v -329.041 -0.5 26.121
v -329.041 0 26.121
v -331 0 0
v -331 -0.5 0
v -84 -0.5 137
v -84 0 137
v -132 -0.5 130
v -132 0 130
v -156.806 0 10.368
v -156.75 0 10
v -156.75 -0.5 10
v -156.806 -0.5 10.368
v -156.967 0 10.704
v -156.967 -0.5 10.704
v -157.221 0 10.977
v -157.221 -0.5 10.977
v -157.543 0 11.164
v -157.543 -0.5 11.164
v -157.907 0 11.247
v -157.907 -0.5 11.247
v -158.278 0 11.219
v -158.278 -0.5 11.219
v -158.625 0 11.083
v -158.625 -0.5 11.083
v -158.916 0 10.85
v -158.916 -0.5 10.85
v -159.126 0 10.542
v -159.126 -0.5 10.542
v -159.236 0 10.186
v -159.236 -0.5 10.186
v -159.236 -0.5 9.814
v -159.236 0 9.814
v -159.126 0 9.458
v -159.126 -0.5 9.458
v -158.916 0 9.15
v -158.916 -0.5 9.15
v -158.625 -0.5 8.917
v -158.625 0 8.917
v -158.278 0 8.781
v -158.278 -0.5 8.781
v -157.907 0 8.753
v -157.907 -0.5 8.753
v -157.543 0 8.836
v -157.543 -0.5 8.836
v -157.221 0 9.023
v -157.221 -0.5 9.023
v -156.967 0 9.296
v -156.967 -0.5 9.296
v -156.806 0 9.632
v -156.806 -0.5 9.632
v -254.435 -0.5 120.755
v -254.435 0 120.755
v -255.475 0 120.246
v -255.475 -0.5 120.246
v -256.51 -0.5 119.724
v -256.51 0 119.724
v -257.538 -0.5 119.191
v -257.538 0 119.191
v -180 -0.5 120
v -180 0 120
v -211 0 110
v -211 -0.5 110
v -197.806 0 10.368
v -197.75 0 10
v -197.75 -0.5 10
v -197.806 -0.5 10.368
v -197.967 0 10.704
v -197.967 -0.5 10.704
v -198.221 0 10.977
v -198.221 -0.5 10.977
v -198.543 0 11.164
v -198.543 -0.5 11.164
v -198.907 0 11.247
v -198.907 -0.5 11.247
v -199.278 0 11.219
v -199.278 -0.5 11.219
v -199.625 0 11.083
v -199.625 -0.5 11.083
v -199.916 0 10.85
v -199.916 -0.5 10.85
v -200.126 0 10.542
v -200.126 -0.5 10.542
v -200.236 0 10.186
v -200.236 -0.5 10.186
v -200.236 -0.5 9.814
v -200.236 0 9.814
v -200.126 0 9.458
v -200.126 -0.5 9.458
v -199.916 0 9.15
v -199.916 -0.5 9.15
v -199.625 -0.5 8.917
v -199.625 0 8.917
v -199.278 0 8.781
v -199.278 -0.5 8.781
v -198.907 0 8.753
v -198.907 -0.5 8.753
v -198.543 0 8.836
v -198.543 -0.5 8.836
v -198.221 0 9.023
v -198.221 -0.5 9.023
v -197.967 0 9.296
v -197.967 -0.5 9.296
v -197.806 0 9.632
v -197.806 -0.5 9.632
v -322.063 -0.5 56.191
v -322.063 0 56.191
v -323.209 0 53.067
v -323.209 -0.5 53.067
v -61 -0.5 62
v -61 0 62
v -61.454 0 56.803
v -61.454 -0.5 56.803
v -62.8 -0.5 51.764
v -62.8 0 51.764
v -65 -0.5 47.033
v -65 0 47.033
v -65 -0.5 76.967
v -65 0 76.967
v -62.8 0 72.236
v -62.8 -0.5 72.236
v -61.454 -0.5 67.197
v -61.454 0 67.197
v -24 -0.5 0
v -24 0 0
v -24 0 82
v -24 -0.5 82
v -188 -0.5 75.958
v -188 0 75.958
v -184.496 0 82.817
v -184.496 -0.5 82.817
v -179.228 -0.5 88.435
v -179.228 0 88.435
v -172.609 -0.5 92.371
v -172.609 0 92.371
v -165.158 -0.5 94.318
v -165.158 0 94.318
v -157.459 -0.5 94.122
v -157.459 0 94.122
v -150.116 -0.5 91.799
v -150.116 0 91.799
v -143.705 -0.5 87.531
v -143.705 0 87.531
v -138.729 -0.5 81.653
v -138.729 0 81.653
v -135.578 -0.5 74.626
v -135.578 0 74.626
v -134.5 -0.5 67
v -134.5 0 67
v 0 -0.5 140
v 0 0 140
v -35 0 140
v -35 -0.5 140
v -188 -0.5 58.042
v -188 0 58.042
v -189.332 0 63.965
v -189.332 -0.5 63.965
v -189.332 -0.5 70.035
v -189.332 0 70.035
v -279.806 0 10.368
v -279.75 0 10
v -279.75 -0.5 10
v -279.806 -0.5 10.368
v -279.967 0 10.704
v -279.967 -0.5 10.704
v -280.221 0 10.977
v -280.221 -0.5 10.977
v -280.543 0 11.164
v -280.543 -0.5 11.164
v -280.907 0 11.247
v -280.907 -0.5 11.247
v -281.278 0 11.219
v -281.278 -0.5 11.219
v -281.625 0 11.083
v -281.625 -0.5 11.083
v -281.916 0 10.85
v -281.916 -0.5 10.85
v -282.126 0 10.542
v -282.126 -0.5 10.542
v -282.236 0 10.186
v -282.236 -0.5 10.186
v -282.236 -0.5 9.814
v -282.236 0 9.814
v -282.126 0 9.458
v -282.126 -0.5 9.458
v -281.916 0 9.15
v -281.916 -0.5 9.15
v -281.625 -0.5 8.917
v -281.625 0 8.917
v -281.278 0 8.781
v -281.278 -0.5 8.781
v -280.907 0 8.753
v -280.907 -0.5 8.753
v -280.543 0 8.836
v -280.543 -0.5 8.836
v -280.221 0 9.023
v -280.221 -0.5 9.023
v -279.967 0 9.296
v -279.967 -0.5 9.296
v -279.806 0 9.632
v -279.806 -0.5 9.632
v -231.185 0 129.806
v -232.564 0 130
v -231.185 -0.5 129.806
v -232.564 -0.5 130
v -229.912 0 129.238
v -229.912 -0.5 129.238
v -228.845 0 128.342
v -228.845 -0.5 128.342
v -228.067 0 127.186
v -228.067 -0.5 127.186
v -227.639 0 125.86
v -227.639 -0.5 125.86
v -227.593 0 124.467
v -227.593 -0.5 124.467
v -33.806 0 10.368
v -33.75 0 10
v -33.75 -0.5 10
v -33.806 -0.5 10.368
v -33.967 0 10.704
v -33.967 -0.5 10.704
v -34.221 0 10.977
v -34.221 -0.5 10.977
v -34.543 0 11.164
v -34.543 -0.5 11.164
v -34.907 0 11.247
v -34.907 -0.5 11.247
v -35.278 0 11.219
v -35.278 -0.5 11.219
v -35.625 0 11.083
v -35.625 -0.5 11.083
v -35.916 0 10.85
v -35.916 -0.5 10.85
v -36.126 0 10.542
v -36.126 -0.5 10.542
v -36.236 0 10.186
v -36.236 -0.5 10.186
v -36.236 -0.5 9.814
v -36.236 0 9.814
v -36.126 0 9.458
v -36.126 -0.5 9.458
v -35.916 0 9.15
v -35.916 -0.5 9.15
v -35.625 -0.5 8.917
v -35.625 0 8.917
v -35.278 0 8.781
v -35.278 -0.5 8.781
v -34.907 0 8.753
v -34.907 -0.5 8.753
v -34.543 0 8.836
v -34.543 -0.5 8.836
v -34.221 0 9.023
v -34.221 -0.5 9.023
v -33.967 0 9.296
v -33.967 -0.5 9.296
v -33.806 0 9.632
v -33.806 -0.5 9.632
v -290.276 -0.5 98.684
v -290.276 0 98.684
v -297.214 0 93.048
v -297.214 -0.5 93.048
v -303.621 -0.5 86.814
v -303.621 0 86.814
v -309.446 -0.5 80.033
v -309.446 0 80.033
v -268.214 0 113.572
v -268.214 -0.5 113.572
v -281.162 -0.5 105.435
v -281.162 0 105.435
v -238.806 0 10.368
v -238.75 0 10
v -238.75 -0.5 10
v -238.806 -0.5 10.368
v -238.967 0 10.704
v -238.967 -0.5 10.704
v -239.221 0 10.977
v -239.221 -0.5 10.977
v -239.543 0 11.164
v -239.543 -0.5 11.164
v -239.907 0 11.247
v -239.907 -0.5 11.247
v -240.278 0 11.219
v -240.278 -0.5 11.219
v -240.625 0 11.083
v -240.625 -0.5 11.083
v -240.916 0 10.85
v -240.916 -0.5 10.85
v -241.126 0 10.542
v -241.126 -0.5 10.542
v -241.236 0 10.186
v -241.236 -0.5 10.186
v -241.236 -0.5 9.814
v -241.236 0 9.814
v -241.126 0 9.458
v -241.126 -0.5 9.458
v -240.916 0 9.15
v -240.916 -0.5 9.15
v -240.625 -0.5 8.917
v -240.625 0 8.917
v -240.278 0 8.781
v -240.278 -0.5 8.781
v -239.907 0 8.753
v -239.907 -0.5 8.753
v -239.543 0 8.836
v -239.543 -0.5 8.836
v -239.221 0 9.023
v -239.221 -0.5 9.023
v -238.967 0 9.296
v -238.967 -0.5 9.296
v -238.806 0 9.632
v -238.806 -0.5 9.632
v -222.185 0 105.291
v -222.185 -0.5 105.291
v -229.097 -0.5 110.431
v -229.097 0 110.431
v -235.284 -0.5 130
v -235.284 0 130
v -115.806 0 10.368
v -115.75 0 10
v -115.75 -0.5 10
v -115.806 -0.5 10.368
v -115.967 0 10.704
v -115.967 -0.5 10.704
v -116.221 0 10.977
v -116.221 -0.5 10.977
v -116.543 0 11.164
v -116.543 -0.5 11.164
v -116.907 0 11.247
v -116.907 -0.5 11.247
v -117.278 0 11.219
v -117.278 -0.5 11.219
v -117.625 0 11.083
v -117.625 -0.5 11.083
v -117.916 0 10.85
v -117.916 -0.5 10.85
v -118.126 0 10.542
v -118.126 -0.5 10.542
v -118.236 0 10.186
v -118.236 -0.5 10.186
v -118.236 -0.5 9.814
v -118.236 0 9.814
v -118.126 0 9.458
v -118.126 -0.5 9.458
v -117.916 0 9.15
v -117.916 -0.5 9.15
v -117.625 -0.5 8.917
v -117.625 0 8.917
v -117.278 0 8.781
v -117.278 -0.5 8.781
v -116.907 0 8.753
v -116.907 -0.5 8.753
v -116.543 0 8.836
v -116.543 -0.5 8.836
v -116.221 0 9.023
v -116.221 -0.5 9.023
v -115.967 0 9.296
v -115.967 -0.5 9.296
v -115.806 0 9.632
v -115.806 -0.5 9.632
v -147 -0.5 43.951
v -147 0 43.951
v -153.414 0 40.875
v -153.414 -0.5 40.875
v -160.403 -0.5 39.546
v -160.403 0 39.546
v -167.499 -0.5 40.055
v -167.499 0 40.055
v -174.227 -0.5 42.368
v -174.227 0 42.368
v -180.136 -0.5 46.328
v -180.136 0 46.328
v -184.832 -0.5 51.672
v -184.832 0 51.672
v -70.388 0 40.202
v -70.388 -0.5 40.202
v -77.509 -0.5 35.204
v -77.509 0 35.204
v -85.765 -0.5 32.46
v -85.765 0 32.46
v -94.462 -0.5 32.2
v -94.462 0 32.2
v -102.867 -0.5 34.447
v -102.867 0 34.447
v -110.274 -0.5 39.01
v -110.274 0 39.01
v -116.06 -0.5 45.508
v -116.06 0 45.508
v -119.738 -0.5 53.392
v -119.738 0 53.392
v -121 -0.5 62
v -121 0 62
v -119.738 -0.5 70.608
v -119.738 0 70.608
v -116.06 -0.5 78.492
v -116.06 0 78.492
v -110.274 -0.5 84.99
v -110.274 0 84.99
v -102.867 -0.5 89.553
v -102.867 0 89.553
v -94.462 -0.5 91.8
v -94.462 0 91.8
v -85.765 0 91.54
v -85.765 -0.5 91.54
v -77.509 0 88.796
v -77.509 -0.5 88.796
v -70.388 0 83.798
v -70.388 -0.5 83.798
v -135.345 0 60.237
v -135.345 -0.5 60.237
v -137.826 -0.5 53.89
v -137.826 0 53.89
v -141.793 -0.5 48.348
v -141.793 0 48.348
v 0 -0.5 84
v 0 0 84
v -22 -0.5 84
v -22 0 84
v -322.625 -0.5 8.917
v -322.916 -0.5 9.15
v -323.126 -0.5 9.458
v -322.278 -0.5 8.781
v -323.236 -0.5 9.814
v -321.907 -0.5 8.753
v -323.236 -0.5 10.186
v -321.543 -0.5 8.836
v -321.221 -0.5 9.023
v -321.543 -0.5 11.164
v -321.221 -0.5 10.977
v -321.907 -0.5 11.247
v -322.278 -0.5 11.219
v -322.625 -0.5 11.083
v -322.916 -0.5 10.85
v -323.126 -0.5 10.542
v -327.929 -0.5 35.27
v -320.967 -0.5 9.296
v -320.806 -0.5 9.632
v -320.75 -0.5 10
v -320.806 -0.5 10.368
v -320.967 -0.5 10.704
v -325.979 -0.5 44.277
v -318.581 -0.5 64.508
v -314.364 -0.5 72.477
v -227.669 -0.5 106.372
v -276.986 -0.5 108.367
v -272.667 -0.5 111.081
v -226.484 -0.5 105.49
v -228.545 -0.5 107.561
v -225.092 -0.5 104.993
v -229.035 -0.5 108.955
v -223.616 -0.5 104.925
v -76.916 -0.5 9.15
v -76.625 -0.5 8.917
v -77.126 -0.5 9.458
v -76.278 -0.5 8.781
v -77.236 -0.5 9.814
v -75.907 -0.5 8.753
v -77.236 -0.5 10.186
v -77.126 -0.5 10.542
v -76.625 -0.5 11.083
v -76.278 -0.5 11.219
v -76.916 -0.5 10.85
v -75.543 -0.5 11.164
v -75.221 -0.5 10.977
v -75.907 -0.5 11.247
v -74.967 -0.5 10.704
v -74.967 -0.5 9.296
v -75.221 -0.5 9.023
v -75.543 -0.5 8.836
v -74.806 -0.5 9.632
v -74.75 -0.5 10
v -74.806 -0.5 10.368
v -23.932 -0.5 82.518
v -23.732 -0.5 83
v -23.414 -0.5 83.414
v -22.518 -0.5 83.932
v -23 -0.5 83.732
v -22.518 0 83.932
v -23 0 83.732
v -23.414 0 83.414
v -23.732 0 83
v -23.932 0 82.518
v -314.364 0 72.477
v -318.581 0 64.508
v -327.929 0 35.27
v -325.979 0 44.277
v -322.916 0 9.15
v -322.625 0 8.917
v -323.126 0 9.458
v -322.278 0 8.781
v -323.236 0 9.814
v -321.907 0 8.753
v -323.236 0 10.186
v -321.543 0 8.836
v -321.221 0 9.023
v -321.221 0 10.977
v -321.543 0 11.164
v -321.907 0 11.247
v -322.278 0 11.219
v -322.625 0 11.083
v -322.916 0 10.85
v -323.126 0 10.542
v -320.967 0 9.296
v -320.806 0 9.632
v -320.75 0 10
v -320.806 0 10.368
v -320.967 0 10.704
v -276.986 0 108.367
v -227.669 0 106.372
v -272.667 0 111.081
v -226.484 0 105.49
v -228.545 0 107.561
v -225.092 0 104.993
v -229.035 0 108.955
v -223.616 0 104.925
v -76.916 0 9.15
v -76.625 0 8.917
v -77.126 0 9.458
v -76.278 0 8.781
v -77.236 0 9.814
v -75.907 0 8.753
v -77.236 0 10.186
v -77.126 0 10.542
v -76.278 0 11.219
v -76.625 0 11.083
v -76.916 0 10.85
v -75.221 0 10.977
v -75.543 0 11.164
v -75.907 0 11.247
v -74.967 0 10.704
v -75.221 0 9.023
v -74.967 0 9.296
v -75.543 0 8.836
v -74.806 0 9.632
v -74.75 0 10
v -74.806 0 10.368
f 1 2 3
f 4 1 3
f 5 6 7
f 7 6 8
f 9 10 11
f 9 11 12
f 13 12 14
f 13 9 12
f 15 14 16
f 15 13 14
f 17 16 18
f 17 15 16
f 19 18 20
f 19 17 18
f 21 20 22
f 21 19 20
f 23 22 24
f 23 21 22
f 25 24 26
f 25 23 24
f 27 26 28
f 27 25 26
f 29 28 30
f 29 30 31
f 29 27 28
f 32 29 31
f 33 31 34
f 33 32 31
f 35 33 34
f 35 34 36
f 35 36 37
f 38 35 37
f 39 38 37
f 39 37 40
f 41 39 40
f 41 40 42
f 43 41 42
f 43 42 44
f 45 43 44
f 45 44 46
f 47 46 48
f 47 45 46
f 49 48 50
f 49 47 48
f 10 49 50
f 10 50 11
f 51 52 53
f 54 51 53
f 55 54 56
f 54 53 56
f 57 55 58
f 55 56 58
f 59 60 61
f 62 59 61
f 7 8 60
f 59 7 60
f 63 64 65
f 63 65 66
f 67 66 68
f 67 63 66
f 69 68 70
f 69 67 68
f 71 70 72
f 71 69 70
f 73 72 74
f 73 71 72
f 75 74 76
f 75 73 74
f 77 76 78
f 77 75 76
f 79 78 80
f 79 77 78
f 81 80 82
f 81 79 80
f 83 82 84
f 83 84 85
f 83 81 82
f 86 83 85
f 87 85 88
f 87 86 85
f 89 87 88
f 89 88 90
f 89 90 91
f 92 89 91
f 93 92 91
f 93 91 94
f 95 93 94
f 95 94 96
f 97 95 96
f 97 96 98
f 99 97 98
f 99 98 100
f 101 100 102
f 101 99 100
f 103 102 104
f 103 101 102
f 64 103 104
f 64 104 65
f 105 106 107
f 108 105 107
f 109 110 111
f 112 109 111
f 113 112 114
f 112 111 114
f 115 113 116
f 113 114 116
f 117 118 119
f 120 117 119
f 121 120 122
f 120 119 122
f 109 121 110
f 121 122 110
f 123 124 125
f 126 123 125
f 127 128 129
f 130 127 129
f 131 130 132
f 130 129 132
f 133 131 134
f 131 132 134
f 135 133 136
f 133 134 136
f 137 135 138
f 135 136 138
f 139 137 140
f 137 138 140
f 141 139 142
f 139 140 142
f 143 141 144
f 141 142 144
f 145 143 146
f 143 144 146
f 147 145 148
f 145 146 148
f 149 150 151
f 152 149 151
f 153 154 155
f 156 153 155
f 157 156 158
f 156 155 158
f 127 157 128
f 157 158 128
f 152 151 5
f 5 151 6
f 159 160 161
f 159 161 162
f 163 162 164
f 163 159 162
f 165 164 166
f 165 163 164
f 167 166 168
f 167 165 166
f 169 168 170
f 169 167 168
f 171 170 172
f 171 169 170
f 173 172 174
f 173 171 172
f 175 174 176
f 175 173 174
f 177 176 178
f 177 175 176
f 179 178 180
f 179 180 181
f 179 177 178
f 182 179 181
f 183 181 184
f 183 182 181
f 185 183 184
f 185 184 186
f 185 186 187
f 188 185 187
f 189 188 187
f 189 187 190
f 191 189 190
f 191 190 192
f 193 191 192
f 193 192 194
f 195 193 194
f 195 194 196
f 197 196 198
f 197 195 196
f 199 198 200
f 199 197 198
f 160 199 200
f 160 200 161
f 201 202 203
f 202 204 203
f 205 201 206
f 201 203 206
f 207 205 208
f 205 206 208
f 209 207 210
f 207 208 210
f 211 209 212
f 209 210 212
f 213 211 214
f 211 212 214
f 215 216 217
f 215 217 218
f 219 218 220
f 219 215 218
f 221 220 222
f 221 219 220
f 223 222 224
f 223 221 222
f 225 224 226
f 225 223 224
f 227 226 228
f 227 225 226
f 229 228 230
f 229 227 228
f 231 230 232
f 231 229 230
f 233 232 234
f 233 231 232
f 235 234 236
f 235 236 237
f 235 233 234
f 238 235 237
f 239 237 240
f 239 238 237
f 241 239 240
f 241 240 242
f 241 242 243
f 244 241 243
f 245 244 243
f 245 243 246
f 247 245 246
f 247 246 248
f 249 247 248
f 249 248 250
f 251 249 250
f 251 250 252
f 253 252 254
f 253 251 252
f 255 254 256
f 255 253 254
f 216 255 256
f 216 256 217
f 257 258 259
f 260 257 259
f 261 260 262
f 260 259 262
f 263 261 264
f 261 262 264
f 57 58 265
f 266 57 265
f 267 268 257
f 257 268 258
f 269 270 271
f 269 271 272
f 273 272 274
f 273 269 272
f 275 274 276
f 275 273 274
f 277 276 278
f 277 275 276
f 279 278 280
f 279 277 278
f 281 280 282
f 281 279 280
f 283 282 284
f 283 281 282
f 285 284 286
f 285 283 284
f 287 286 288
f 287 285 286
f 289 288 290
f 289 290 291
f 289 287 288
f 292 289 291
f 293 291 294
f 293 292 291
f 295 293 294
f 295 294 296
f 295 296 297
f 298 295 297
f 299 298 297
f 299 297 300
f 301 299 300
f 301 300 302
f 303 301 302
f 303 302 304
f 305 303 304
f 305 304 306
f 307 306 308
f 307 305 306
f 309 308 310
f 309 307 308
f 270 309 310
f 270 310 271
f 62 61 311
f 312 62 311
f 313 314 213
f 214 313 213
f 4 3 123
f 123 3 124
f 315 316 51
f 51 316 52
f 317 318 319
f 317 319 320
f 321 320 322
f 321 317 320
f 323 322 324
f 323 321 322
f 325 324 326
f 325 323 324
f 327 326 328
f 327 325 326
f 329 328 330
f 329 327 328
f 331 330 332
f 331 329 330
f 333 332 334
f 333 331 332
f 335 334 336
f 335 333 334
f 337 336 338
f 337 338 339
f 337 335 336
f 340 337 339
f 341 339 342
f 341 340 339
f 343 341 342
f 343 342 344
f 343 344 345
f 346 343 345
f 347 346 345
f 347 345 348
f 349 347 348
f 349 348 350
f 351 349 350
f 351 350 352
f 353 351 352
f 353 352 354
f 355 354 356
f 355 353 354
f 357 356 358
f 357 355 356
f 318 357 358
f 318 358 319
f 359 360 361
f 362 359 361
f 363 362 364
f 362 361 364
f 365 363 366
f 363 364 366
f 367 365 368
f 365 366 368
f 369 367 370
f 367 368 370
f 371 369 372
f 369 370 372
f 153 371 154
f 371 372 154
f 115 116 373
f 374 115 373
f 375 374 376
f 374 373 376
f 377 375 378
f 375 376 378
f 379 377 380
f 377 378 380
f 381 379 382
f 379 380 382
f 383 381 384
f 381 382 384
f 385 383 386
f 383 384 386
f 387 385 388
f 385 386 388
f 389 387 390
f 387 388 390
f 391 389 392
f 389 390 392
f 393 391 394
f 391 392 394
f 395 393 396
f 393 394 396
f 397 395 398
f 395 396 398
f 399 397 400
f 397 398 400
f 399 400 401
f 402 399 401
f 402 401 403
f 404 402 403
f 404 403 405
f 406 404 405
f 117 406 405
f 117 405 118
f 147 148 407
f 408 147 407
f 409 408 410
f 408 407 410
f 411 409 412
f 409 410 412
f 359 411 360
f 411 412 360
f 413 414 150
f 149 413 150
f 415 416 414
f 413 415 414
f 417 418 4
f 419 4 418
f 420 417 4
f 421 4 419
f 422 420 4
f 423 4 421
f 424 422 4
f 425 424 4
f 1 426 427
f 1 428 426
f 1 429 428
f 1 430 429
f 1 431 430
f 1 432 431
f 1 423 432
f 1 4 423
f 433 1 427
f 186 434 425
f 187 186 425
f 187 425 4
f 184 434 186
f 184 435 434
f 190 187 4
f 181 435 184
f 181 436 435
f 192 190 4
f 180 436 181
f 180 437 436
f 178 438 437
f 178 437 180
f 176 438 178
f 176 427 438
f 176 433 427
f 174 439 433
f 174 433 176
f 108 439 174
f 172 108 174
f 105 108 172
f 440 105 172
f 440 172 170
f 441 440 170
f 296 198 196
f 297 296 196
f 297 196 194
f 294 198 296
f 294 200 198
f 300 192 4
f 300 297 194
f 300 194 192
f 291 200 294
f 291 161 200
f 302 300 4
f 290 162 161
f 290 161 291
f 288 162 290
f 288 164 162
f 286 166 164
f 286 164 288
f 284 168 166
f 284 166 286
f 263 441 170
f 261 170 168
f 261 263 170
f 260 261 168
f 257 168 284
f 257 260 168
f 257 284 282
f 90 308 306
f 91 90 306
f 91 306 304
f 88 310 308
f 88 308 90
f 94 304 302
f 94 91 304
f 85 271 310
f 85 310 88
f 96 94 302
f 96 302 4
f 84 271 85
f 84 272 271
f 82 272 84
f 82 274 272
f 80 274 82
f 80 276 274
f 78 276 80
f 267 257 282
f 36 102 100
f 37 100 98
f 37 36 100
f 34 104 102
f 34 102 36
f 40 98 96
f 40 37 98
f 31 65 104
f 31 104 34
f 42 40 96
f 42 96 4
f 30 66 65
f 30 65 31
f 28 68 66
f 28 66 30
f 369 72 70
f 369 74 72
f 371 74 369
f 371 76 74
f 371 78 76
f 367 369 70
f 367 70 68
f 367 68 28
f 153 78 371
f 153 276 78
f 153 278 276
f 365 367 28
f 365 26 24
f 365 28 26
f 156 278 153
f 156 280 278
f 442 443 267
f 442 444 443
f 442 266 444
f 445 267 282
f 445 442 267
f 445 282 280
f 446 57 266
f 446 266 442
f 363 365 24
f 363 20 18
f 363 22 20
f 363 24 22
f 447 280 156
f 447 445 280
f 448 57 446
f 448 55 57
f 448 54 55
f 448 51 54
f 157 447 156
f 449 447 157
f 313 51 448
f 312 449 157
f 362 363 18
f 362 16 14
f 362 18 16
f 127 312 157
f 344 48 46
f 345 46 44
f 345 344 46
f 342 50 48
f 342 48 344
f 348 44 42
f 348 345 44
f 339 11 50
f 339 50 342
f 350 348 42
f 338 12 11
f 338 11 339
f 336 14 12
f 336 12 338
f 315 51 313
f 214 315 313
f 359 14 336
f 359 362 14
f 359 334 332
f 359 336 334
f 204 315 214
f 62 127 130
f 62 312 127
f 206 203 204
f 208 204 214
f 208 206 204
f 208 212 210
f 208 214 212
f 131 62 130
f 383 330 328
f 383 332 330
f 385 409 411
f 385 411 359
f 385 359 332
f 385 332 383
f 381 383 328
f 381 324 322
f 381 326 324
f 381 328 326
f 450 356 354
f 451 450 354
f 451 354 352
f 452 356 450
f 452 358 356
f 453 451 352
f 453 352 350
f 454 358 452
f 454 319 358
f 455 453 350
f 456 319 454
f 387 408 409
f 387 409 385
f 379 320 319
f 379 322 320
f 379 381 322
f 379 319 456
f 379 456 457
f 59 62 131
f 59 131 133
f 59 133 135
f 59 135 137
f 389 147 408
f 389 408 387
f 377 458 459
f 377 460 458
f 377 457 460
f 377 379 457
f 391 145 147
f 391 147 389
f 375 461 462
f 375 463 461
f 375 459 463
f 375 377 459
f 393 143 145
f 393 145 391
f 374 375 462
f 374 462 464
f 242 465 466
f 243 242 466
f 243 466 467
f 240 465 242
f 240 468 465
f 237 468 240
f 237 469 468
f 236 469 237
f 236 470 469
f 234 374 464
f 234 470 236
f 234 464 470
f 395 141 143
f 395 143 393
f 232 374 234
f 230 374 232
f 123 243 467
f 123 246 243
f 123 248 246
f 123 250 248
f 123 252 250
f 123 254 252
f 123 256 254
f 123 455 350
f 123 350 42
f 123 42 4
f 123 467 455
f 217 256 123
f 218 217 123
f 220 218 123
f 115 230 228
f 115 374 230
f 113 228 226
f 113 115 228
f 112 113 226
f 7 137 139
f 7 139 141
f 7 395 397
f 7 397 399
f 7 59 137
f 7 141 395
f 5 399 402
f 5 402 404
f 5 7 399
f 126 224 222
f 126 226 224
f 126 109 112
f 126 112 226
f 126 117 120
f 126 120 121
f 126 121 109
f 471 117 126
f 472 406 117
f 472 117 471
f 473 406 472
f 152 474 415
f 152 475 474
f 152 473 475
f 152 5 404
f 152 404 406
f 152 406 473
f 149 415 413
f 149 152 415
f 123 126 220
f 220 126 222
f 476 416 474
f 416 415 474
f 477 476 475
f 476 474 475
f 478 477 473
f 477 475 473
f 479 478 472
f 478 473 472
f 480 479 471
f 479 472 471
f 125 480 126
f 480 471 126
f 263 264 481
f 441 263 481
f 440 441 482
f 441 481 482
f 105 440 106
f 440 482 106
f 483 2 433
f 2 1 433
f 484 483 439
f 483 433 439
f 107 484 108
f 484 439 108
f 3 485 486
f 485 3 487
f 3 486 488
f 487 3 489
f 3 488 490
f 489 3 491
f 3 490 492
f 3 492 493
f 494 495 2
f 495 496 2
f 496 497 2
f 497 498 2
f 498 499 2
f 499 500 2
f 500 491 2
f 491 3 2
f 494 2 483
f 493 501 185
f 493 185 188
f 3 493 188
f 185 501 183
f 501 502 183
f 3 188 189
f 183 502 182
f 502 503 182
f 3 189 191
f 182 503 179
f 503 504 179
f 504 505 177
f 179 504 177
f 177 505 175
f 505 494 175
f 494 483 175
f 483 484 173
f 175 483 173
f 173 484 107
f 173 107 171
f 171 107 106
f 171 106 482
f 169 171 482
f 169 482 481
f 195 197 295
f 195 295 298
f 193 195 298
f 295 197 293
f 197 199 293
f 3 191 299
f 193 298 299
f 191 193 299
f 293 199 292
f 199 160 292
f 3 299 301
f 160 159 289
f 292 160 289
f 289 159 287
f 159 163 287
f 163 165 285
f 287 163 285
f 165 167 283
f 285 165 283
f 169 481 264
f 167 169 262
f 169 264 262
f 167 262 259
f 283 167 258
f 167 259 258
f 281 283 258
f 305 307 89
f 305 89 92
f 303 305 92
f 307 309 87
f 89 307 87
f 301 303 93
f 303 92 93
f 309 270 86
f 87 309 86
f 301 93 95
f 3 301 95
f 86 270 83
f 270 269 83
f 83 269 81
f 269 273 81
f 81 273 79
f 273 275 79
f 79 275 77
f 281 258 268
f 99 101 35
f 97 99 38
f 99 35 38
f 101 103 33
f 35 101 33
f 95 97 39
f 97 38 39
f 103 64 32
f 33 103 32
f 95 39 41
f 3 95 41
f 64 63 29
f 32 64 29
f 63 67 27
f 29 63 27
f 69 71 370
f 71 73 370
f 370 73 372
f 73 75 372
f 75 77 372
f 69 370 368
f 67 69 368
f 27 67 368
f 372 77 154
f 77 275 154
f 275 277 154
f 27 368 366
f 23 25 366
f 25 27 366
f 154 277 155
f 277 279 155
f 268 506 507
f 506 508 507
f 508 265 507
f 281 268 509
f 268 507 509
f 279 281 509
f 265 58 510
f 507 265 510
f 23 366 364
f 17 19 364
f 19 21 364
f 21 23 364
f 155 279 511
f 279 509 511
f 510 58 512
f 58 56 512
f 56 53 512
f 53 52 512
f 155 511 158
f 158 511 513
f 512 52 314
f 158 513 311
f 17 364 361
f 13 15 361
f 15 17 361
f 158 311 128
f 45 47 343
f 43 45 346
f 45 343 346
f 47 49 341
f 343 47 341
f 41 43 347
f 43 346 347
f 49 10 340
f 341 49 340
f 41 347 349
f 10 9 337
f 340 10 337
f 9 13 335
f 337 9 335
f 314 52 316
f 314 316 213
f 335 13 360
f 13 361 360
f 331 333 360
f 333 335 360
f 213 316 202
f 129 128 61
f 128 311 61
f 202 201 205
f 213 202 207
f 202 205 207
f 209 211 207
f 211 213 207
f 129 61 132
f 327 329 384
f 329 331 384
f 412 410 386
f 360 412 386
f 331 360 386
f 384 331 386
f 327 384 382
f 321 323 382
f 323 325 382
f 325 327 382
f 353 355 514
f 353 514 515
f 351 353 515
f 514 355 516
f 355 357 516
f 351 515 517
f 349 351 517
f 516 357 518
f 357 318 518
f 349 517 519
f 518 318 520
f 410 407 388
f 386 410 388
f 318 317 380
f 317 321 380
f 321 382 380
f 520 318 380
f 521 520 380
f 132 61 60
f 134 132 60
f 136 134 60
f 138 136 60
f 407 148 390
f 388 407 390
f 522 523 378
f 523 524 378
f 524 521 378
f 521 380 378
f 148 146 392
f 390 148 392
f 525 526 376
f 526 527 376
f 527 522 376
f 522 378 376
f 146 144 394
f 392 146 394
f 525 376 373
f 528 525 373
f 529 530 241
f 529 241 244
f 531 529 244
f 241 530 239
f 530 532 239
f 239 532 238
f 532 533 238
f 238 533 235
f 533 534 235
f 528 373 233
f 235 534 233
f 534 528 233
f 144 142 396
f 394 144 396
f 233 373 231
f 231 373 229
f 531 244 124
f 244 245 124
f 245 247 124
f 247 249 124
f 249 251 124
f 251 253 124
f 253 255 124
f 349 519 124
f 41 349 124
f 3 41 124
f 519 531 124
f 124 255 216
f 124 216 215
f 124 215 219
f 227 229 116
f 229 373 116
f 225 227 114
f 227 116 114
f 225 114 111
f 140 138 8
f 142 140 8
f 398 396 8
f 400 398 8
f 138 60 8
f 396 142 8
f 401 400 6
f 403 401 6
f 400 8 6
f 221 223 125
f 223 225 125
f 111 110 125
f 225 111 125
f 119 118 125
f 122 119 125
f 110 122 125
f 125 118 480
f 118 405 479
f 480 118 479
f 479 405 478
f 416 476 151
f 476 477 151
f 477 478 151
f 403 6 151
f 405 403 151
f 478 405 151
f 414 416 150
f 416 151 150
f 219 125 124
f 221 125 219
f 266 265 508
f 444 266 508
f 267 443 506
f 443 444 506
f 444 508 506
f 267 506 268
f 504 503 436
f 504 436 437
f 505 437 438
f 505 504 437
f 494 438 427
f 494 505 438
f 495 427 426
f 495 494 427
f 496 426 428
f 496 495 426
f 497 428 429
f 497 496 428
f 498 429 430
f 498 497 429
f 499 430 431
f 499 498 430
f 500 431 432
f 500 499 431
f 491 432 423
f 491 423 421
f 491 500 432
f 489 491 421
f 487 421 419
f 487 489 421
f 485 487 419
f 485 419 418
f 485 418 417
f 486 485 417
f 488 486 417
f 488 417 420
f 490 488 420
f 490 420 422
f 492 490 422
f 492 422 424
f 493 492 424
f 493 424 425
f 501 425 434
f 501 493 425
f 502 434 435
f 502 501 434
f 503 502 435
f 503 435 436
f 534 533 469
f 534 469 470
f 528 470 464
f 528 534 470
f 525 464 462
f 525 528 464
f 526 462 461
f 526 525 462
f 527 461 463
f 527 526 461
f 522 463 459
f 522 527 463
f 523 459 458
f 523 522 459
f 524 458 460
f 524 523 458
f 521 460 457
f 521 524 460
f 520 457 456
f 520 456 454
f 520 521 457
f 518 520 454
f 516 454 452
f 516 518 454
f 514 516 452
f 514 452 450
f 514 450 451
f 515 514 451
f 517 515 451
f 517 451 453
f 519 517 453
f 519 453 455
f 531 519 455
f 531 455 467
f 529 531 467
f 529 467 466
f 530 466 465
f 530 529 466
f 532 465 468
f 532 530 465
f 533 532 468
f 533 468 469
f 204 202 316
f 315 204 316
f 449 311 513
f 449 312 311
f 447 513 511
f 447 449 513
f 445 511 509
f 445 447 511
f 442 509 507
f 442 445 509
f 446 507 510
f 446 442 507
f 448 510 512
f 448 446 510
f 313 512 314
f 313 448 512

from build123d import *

# Parameters (mm, degrees)
F0_R        = 1.25
F1_DEPTH    = 0.5
F2_R        = 5
F3_T1_DEPTH = 74.0375335511
F3_T3_DEPTH = 9.1893951821
F3_T5_DEPTH = 38.8426126869
F3_T7_DEPTH = 73.4476683762
F4_R        = 100
F5_R        = 5
F6_R        = 2


# Not quite as in the source:
# - a fillet or chamfer that OpenCascade refuses, or shapes differently, is made with other operations: its cross-section is extruded or revolved along the edge and cut away or added


with BuildPart() as f1:
    # F0 (on Front) → F1 (new body)
    with BuildSketch(Plane.XZ):
        with BuildLine():
            Line((-65, 0), (-24, 0))
            Line((-24, 0), (-24, 84))
            Line((-24, 84), (0, 84))
            Line((0, 84), (0, 140))
            Line((0, 140), (-35, 140))
            Line((-35, 140), (-84, 137))
            Line((-84, 137), (-132, 130))
            Line((-132, 130), (-180, 120))
            Line((-180, 120), (-211, 110))
            Line((-211, 110), (-230, 102))
            Line((-230, 102), (-227, 130))
            Line((-227, 130), (-235.2838218212, 130))
            Line((-235.2838218212, 130), (-256, 120))
            Line((-256, 120), (-275, 110))
            Line((-275, 110), (-302, 90))
            Line((-302, 90), (-311, 78))
            Line((-311, 78), (-311, 0))
            Line((-311, 0), (-270, 0))
            Line((-270, 0), (-229, 0))
            Line((-229, 0), (-188, 0))
            Line((-188, 0), (-188, 58.0417635664))
            ThreePointArc((-188, 58.0417635664), (-189.5, 67), (-188, 75.9582364336))
            ThreePointArc((-188, 75.9582364336), (-157.4585244689, 94.1224077102), (-134.5, 67))
            ThreePointArc((-134.5, 67), (-137.8261504927, 53.8898893979), (-147, 43.9511388568))
            Line((-147, 43.9511388568), (-147, 0))
            Line((-147, 0), (-106, 0))
            Line((-106, 0), (-106, 36.0192378865))
            ThreePointArc((-106, 36.0192378865), (-112.1995806787, 83.2268174498), (-65, 76.9666295471))
            ThreePointArc((-65, 76.9666295471), (-62.0172465076, 69.7459666924), (-61, 62))
            ThreePointArc((-61, 62), (-62.0172465076, 54.2540333076), (-65, 47.0333704529))
            Line((-65, 47.0333704529), (-65, 0))
        make_face()
        with Locations((-281, 10)):
            Circle(F0_R, mode=Mode.SUBTRACT)
        with Locations((-240, 10)):
            Circle(F0_R, mode=Mode.SUBTRACT)
        with Locations((-199, 10)):
            Circle(F0_R, mode=Mode.SUBTRACT)
        with Locations((-117, 10)):
            Circle(F0_R, mode=Mode.SUBTRACT)
        with Locations((-35, 10)):
            Circle(F0_R, mode=Mode.SUBTRACT)
        Polygon((-331, 0), (-311, 0), (-311, 78), (-317, 70), (-328, 40), align=None)
        with Locations((-322, 10)):
            Circle(F0_R, mode=Mode.SUBTRACT)
        with BuildLine():
            Line((-188, 0), (-147, 0))
            Line((-147, 0), (-147, 43.9511388568))
            ThreePointArc((-147, 43.9511388568), (-170.9379206853, 40.9930091356), (-188, 58.0417635664))
            Line((-188, 58.0417635664), (-188, 0))
        make_face()
        with Locations((-158, 10)):
            Circle(F0_R, mode=Mode.SUBTRACT)
        with BuildLine():
            Line((-106, 0), (-65, 0))
            Line((-65, 0), (-65, 47.0333704529))
            ThreePointArc((-65, 47.0333704529), (-83.2168271863, 33.0272158578), (-106, 36.0192378865))
            Line((-106, 36.0192378865), (-106, 0))
        make_face()
        with Locations((-76, 10)):
            Circle(F0_R, mode=Mode.SUBTRACT)
    extrude(amount=F1_DEPTH)

    # F2
    f2_edges = [f1.edges().sort_by_distance(p)[0] for p in [
        (-230, -0.25, 102),
    ]]
    fillet(f2_edges, radius=F2_R)

    # F3: fillet of radius 100 on 4 edges, made by hand

    # F3_s2 → F3_t1 (cut)
    with BuildSketch(Plane.XZ.offset(-36.7687667756)):
        with BuildLine():
            ThreePointArc((-308.1754959739, 81.7660053682), (-316.0546249868, 69.4866370062), (-322.0631275625, 56.191470284))
            Line((-322.0631275625, 56.191470284), (-317, 70))
            Line((-317, 70), (-308.1754959739, 81.7660053682))
        make_face()
    extrude(amount=F3_T1_DEPTH, mode=Mode.SUBTRACT)

    # F3_s4 → F3_t3 (cut)
    with BuildSketch(Plane.XZ.offset(-4.3446975911)):
        with BuildLine():
            ThreePointArc((-254.4349231681, 120.7554853112), (-255.9932004856, 119.9865175696), (-257.5378808276, 119.1905890381))
            Line((-257.5378808276, 119.1905890381), (-256, 120))
            Line((-256, 120), (-254.4349231681, 120.7554853112))
        make_face()
    extrude(amount=F3_T3_DEPTH, mode=Mode.SUBTRACT)

    # F3_s6 → F3_t5 (cut)
    with BuildSketch(Plane.XZ.offset(-19.1713063434)):
        with BuildLine():
            ThreePointArc((-268.2139846679, 113.5715870169), (-274.8437916361, 109.7514039115), (-281.1620964472, 105.4354841132))
            Line((-281.1620964472, 105.4354841132), (-275, 110))
            Line((-275, 110), (-268.2139846679, 113.5715870169))
        make_face()
    extrude(amount=F3_T5_DEPTH, mode=Mode.SUBTRACT)

    # F3_s8 → F3_t7 (cut)
    with BuildSketch(Plane.XZ.offset(-36.4738341881)):
        with BuildLine():
            ThreePointArc((-290.2764752677, 98.6840923943), (-301.2536395134, 89.2491836695), (-310.7537202051, 78.3283730598))
            Line((-310.7537202051, 78.3283730598), (-302, 90))
            Line((-302, 90), (-290.2764752677, 98.6840923943))
        make_face()
    extrude(amount=F3_T7_DEPTH, mode=Mode.SUBTRACT)

    # F4
    f4_edges = [f1.edges().sort_by_distance(p)[0] for p in [
        (-328, -0.25, 40),
    ]]
    fillet(f4_edges, radius=F4_R)

    # F5
    f5_edges = [f1.edges().sort_by_distance(p)[0] for p in [
        (-227, -0.25, 130),
    ]]
    fillet(f5_edges, radius=F5_R)

    # F6
    f6_edges = [f1.edges().sort_by_distance(p)[0] for p in [
        (-24, -0.25, 84),
    ]]
    fillet(f6_edges, radius=F6_R)


solid = f1.part
